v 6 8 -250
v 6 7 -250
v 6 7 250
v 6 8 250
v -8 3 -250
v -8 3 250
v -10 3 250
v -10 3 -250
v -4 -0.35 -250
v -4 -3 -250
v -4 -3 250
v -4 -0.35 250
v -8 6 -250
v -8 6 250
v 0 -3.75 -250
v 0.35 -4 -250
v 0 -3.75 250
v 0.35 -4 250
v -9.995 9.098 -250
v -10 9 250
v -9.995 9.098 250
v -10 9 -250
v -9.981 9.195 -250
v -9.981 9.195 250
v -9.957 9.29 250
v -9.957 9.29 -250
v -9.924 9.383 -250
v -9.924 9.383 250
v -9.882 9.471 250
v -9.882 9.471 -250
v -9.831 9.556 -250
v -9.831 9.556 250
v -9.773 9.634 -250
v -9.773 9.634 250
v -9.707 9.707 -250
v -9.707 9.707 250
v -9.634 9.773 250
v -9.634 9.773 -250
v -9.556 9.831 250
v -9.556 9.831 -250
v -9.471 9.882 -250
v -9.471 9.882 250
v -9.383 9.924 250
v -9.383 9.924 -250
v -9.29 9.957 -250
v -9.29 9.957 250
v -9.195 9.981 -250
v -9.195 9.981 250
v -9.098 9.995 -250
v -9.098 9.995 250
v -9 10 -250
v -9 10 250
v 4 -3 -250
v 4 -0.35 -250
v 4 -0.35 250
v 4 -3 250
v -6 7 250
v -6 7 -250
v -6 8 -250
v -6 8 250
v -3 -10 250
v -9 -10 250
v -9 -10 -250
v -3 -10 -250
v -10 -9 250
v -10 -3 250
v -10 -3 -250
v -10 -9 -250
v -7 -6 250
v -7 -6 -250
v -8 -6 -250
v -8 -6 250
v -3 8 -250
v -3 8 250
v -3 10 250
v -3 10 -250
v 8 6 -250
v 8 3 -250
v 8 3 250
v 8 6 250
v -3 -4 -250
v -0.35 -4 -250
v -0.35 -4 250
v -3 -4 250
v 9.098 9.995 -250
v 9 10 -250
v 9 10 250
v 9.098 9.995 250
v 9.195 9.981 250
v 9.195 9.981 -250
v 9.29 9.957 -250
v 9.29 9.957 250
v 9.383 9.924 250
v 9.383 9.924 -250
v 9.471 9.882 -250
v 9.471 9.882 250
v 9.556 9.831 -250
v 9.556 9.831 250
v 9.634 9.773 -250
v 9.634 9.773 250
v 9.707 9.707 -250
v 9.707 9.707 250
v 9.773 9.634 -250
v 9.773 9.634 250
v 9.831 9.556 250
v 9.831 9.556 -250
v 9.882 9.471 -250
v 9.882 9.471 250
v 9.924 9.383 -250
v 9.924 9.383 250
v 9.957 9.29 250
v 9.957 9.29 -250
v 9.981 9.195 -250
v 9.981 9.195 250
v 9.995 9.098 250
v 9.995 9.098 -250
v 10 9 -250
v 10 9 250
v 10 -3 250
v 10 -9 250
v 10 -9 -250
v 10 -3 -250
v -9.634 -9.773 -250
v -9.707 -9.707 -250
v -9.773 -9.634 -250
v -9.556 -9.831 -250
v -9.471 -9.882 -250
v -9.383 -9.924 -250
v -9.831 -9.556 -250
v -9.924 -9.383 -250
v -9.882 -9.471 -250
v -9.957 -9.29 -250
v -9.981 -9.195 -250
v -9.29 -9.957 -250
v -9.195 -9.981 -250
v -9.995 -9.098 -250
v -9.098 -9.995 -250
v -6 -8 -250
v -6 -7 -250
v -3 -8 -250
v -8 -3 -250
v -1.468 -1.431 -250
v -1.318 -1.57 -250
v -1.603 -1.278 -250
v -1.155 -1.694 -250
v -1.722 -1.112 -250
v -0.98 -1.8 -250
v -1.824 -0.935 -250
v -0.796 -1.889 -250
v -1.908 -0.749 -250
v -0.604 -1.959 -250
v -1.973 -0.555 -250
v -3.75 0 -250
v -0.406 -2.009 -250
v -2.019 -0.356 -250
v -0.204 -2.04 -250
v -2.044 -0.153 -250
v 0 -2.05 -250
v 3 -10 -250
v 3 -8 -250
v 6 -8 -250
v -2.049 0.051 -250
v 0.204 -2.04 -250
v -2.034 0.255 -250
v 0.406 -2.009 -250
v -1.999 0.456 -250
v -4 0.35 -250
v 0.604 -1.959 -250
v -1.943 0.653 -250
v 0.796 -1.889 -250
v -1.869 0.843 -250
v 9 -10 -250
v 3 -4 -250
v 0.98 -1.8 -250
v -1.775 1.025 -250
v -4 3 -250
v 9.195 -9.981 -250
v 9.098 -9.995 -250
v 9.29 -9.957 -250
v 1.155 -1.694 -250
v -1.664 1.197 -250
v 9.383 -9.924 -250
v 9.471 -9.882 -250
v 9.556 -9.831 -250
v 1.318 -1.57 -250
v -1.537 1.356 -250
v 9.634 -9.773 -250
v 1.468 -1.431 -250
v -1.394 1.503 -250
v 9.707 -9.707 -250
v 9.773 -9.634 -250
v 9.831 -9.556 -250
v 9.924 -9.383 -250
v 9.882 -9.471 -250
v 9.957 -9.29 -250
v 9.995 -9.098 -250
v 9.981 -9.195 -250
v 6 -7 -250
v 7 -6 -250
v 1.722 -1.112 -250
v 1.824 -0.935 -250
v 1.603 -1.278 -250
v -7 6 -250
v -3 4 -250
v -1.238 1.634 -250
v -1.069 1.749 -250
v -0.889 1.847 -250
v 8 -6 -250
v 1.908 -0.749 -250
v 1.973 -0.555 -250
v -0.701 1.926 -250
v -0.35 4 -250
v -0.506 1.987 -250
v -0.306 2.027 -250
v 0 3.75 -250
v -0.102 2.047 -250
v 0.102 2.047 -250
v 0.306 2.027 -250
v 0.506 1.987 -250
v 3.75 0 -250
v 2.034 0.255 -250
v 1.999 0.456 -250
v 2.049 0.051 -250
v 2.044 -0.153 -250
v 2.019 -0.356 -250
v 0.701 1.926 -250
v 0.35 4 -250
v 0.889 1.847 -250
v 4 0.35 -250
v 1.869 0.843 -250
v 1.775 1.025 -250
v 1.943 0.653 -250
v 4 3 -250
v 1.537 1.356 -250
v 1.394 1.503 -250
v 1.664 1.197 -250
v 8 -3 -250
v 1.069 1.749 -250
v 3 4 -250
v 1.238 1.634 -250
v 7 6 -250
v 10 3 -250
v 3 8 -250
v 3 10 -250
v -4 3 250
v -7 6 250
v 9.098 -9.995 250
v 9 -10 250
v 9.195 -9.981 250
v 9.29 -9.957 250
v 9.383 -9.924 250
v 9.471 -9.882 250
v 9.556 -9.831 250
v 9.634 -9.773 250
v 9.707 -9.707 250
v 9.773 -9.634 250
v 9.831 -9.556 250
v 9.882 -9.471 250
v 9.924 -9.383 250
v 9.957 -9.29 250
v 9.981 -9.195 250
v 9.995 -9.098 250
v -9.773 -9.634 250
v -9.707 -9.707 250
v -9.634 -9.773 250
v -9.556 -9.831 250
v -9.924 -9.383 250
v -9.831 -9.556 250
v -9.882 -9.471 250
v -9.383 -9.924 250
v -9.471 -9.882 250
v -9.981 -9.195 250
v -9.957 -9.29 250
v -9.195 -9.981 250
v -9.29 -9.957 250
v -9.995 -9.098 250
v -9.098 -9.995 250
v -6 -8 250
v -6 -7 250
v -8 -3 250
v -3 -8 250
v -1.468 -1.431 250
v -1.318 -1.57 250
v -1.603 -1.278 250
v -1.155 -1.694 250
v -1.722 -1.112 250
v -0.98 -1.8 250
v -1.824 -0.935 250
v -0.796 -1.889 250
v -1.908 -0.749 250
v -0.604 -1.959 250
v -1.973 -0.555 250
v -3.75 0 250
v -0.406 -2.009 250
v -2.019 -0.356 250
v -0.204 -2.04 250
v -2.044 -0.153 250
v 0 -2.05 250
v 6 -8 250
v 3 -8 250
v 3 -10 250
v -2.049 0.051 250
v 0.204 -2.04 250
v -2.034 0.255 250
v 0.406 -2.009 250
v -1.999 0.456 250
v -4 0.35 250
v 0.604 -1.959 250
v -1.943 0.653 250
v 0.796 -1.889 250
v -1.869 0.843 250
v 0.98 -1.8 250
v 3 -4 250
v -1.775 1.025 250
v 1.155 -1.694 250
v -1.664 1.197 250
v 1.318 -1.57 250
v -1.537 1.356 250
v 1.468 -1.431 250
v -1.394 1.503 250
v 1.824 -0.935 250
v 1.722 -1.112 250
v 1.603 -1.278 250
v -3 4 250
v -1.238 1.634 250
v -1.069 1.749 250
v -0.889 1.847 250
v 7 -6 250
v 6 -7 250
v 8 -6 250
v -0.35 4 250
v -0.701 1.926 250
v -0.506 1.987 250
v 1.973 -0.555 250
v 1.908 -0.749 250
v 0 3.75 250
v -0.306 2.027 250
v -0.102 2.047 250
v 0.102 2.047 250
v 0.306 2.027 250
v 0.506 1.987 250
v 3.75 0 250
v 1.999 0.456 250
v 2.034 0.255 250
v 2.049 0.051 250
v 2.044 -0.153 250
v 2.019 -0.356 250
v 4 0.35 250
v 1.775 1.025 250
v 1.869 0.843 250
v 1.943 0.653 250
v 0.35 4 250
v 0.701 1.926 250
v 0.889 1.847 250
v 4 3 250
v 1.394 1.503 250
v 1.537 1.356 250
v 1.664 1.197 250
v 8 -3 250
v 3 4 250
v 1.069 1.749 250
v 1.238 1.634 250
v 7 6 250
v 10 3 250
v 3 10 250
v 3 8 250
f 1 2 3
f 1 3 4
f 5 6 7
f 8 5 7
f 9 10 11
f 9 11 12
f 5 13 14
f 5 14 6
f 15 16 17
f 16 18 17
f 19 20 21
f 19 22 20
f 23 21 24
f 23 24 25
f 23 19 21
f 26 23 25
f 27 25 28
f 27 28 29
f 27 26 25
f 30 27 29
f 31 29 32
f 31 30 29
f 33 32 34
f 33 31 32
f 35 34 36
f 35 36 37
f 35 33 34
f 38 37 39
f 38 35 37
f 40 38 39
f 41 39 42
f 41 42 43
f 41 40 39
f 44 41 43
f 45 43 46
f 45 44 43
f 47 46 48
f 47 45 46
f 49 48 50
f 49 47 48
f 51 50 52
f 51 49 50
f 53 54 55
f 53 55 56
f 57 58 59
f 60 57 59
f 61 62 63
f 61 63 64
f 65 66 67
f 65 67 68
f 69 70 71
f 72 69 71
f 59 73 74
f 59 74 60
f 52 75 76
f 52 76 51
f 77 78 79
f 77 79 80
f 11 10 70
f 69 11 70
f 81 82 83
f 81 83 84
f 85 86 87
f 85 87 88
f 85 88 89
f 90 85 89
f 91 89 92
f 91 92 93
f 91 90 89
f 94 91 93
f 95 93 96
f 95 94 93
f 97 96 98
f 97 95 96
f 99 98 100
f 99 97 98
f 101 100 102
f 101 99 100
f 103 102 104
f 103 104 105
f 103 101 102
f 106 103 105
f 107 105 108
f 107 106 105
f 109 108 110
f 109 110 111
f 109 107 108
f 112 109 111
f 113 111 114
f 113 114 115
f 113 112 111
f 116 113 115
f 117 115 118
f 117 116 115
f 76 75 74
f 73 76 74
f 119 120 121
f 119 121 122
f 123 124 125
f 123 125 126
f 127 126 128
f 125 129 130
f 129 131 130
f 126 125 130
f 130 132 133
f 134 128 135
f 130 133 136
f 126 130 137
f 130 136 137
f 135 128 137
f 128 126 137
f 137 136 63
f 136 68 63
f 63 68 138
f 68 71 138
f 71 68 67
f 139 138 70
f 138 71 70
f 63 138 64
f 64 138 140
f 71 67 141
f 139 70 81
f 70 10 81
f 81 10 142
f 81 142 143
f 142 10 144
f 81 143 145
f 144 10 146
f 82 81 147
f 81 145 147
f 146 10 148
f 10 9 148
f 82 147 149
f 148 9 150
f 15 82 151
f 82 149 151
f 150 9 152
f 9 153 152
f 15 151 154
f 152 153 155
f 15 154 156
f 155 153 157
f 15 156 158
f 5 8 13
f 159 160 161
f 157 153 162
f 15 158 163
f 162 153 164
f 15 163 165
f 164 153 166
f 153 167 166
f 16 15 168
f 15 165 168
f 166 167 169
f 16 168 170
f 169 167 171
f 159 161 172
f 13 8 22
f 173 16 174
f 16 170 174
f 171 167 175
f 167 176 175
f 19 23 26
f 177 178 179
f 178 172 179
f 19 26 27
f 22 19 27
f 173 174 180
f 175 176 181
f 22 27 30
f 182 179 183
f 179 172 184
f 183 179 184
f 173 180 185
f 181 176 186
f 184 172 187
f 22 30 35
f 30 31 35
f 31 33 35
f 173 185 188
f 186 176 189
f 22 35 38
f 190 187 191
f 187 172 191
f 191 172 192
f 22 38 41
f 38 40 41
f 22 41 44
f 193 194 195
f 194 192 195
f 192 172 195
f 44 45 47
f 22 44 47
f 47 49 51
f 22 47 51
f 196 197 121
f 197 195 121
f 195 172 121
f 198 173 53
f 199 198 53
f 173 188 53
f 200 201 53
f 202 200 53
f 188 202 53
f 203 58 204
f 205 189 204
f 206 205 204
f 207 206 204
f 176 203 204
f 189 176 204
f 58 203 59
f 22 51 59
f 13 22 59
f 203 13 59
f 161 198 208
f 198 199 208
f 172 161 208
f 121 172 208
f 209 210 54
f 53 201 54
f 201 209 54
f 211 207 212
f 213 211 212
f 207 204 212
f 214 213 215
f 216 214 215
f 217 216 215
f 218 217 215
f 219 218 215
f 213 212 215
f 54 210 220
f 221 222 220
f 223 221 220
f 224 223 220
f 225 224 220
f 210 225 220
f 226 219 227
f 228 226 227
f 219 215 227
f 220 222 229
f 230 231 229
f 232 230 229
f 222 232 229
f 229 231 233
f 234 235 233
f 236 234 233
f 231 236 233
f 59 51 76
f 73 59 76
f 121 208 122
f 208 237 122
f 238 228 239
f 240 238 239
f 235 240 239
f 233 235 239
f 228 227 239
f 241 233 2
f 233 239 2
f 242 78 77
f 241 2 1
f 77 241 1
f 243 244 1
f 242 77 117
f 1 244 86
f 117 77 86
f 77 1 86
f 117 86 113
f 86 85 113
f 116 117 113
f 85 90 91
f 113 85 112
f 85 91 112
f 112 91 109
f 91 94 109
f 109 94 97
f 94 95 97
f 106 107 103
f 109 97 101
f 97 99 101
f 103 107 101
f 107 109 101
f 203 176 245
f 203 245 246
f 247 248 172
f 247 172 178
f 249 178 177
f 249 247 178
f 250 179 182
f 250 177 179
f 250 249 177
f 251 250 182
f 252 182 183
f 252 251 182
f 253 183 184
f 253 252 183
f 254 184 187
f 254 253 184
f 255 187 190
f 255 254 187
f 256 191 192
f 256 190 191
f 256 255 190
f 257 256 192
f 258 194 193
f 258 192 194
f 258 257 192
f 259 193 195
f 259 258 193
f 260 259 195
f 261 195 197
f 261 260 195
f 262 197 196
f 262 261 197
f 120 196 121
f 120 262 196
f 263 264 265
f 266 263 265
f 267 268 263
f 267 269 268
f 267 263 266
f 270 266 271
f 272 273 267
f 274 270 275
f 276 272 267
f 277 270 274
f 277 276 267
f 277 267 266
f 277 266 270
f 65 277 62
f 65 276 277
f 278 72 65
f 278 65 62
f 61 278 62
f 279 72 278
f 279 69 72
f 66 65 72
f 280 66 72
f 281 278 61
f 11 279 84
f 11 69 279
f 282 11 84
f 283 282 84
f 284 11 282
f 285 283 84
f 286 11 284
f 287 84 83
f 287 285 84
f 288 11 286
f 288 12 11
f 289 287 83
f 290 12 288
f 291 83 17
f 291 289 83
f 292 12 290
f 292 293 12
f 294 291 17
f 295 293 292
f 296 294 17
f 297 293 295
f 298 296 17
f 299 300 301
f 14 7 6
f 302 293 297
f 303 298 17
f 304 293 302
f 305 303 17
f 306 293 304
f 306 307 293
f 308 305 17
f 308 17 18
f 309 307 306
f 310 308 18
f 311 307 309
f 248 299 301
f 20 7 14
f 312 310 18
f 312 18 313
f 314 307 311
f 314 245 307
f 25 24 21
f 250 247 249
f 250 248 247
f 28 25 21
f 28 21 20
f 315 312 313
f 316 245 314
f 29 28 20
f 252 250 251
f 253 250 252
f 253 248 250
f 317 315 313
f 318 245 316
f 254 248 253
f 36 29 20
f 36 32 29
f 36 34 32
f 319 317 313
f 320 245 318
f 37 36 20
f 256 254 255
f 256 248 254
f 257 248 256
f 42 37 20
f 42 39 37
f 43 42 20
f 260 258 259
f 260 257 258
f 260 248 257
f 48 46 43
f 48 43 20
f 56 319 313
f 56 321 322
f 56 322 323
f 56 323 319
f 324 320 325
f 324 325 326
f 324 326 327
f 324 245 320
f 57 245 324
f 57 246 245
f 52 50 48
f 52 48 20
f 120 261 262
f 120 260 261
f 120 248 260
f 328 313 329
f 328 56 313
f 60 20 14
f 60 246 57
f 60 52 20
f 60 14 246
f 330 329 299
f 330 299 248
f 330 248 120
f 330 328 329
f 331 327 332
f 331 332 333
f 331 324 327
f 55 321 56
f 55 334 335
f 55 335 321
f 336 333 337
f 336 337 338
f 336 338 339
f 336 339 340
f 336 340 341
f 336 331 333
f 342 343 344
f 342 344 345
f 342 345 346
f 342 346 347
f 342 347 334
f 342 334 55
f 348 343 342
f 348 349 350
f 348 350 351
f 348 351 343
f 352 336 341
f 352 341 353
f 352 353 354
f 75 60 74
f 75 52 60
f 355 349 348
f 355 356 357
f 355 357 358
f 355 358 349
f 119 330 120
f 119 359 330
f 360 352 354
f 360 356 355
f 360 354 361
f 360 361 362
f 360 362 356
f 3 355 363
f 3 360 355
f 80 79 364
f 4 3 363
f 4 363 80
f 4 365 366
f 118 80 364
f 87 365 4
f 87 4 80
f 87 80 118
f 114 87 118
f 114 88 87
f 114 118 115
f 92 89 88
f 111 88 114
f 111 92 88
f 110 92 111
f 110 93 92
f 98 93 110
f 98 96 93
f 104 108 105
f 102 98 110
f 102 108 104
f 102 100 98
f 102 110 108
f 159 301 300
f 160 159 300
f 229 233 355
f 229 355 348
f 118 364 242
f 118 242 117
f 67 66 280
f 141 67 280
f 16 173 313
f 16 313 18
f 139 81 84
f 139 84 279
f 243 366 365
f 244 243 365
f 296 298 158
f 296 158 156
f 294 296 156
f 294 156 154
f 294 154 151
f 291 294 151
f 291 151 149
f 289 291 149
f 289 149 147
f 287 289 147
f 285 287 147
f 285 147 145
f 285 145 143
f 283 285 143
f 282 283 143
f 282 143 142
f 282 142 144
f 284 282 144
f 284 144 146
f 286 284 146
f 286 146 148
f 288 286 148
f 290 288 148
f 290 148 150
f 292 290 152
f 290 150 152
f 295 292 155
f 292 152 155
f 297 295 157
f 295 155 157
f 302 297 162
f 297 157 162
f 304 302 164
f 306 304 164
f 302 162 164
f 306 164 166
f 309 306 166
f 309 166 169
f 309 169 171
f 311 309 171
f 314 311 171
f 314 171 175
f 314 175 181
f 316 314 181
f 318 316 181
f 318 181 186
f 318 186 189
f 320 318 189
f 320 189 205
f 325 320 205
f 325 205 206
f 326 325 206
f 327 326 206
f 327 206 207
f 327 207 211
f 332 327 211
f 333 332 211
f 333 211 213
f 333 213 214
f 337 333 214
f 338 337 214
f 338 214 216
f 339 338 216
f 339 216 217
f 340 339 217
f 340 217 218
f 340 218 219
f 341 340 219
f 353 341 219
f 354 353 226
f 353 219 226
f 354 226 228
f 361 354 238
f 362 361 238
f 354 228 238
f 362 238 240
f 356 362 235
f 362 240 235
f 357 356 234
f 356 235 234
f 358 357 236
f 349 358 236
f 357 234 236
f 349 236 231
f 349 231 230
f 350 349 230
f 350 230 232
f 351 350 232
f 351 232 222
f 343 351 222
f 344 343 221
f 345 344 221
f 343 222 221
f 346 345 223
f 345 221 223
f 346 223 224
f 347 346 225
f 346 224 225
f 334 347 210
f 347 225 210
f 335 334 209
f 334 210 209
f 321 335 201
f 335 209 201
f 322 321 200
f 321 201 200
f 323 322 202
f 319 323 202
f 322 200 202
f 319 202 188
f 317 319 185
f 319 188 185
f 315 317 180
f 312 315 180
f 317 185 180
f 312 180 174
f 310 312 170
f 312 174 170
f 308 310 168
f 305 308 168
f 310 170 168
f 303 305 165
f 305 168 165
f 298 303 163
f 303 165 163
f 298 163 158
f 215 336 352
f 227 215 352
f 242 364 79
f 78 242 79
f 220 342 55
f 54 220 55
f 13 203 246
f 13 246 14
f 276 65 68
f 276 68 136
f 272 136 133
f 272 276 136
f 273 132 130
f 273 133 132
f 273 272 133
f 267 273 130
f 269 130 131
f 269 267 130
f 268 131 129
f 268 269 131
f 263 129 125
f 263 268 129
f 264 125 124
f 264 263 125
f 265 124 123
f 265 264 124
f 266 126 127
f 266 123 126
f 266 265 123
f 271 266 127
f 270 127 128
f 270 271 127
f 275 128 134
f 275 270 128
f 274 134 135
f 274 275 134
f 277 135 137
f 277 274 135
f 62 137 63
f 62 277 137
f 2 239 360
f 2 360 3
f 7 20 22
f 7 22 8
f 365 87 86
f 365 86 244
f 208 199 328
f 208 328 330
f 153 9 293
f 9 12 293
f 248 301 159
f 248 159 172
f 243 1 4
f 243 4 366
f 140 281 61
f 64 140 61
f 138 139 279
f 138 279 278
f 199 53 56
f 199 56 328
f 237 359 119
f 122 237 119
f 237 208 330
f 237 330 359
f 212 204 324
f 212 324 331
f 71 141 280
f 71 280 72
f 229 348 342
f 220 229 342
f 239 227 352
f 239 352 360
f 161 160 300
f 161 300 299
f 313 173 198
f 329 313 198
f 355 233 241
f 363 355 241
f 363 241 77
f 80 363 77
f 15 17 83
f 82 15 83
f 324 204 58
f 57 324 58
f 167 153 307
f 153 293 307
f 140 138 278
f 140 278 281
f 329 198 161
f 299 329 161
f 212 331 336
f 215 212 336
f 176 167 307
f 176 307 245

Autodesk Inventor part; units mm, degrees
ref_plane "YZ Plane" through (0, 0, 0) normal (1, 0, 0) x (0, 1, 0)
ref_plane "XZ Plane" through (0, 0, 0) normal (0, 1, 0) x (-1, 0, 0)
ref_plane "XY Plane" through (0, 0, 0) normal (0, 0, 1) x (1, 0, 0)
sketch "Sketch1" plane through (0, 0, 0) normal (0, 0, 1) x (1, 0, 0)
  line L0 (-10, -10) -> (10, -10)
  line L1 (10, -10) -> (10, 10)
  line L2 (10, 10) -> (-10, 10)
  line L3 (-10, 10) -> (-10, -10)
  line L4 (-10, -10) -> (10, 10) construction
  line L5 (10, -10) -> (-10, 10) construction
  point P0 (0, 0)
  dimension "d0" = 20
  dimension "d1" = 20
extrude "Extrusion1" add sketch "Sketch1" along normal mid plane 500
sketch "Sketch2" plane through (0, 0, 250) normal (0, 0, 1) x (1, 0, 0)
  line L0 (-10, -10) -> (10, -10) projected
  line L1 (10, -10) -> (10, 10) projected
  line L2 (10, 10) -> (-10, 10) projected
  line L3 (-10, 10) -> (-10, -10) projected
  line L4 (10, 10) -> (-10, 10) projected
  line L5 (-3, 10) -> (-3, 8)
  line L6 (-3, 8) -> (-6, 8)
  line L7 (-3, 4) -> (3, 4)
  line L8 (6, 8) -> (3, 8)
  line L9 (3, 8) -> (3, 10)
  line L10 (-3, 4) -> (-6, 7)
  line L11 (-6, 7) -> (-6, 8)
  line L12 (3, 4) -> (6, 7)
  line L13 (6, 7) -> (6, 8)
  line L14 (-0.35, 4) -> (0, 3.75)
  line L15 (0, 3.75) -> (0.35, 4)
  point P0 (0, 0)
  point P1 (0, 4)
  dimension "d5" = 2
  dimension "d6" = 4
  dimension "d7" = 12
  dimension "d8" = 6
  dimension "d9" = 1
  dimension "d10" = 6
  dimension "d11" = 6
  dimension "d25" = 0.25
  dimension "d26" = 0.7
extrude "Extrusion2" cut sketch "Sketch2" against normal through all contours L2 L9 L8 L13 L12 L7 L10 L11 L6 L5 | L7 L15 L14
pattern_circular "Circular Pattern1" count 4 over 360 about axis through (0, 0, -10) along (0, 0, 1) of "Extrusion2"
fillet "Fillet1" radius 1 4 edges at (10, 10, 0) (10, -10, 0) (-10, 10, 0) (-10, -10, 0)
sketch "Sketch6" plane through (0, 0, 250) normal (0, 0, 1) x (1, 0, 0)
  point P0 (0, 0)
  point P1 (0, 0)
hole "Hole3" at (0, 0, 250) direction (0, 0, -1) diameter 4.1 end through all
properties part number "20x20 Extrusion with threaded end" material "Aluminum 6061"
